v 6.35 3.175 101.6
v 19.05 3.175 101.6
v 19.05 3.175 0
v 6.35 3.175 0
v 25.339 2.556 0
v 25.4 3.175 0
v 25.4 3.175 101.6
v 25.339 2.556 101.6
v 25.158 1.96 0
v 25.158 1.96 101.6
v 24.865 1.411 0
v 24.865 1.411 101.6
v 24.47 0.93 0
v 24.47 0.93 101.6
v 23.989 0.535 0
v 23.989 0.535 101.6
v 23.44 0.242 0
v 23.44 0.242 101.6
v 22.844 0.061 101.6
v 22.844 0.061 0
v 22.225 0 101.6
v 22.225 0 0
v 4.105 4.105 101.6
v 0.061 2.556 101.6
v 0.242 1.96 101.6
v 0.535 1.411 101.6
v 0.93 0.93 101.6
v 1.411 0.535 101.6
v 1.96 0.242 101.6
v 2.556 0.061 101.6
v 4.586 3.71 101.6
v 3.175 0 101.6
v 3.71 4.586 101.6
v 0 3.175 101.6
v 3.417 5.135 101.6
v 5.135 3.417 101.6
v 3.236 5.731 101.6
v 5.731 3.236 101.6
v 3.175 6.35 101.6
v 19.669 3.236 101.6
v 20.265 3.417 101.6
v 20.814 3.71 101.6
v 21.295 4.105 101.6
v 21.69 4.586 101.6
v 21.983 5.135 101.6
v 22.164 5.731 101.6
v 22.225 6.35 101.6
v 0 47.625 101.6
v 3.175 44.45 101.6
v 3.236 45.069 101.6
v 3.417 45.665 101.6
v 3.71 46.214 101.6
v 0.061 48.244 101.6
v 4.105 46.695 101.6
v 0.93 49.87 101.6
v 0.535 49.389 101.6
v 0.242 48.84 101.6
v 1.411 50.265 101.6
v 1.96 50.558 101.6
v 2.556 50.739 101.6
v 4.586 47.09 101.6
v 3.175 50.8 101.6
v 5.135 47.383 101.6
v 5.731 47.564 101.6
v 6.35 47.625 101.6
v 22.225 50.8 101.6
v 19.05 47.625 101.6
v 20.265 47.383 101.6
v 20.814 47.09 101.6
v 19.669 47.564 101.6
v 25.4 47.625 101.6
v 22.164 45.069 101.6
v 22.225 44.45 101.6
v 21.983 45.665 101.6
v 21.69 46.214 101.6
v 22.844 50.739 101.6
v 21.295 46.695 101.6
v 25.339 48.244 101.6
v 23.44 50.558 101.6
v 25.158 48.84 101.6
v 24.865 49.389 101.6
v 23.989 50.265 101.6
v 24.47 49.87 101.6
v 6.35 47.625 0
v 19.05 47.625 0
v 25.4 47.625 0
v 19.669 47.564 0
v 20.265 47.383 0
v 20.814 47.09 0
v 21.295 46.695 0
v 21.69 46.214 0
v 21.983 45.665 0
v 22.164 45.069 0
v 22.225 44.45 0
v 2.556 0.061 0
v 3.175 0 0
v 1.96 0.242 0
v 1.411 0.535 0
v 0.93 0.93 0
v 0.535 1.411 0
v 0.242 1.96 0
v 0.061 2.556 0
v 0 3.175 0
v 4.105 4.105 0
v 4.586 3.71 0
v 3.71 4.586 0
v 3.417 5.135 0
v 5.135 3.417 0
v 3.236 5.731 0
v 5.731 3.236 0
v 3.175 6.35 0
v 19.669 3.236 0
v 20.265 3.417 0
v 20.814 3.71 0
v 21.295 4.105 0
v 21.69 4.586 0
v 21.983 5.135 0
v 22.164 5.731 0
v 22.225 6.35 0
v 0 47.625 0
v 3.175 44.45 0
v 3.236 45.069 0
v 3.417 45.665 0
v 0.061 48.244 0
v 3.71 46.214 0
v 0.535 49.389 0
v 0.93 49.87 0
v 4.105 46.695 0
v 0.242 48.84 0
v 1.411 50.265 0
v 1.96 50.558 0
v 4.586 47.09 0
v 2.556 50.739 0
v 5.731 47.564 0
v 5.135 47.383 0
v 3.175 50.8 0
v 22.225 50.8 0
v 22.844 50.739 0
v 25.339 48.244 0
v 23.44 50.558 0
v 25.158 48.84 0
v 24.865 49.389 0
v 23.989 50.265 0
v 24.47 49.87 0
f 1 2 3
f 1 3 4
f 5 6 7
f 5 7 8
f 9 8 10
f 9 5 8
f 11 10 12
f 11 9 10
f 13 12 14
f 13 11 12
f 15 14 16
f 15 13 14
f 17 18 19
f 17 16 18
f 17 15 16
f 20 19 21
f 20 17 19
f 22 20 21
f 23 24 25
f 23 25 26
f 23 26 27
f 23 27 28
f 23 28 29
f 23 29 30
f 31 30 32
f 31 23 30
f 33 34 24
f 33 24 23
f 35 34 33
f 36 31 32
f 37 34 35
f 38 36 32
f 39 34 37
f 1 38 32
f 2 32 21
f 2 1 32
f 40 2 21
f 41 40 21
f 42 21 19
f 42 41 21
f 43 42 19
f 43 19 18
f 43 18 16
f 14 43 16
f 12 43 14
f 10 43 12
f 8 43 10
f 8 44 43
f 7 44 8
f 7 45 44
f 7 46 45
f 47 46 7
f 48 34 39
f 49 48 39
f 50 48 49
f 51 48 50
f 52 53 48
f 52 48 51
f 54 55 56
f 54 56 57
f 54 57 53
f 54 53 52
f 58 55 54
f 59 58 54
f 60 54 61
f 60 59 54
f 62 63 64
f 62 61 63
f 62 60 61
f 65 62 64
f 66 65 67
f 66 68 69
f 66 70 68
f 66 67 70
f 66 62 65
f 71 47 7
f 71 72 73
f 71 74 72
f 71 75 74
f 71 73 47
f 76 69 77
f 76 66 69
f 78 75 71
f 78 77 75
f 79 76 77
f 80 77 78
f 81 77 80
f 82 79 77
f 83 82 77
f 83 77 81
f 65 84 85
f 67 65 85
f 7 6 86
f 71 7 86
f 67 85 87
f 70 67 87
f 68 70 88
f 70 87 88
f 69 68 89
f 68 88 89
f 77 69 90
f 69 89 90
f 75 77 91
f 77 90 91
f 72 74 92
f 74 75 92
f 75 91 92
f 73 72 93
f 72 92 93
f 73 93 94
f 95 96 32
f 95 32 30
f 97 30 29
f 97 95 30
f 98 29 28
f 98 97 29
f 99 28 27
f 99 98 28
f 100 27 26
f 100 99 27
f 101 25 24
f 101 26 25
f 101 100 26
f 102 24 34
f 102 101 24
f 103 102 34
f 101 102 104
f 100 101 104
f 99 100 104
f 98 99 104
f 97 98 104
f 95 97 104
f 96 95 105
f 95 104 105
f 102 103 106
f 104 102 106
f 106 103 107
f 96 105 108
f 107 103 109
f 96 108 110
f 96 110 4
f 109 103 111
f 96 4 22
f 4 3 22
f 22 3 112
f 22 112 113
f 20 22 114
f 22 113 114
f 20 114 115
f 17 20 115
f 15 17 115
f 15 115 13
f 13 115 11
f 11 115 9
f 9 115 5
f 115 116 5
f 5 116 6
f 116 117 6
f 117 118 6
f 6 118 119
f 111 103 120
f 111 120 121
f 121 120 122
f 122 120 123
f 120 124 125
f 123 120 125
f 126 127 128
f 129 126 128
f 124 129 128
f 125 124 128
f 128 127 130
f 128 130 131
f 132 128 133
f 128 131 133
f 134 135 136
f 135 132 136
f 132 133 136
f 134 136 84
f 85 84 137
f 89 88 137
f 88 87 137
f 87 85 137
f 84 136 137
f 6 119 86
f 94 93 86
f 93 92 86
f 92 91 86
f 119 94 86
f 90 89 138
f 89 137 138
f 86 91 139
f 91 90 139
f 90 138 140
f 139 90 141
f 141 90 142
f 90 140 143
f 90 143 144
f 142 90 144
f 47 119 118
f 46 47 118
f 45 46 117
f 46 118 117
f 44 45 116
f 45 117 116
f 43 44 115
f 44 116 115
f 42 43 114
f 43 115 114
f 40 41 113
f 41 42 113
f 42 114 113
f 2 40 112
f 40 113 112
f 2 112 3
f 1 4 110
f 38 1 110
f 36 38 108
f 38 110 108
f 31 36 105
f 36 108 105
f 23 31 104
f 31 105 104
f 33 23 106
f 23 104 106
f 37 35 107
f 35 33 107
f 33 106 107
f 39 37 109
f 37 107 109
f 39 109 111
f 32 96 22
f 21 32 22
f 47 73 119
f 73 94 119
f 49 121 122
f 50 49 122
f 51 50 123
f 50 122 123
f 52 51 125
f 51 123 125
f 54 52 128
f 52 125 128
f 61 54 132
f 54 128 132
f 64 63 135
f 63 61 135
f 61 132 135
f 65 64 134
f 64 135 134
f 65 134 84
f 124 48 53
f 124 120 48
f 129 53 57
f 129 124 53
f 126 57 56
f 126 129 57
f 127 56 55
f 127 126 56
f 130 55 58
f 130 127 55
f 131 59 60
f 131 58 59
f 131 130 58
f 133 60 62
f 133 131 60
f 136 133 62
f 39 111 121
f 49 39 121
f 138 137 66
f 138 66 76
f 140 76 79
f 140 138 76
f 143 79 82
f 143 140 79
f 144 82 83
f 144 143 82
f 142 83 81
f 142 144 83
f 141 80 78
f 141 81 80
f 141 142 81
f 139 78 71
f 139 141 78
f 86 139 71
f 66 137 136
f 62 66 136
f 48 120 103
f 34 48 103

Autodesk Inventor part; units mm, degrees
ref_plane "YZ Plane" through (0, 0, 0) normal (1, 0, 0) x (0, 1, 0)
ref_plane "XZ Plane" through (0, 0, 0) normal (0, 1, 0) x (-1, 0, 0)
ref_plane "XY Plane" through (0, 0, 0) normal (0, 0, 1) x (1, 0, 0)
sketch "Sketch1" plane through (0, 0, 0) normal (0, 0, 1) x (1, 0, 0)
  line L0 (3.175, 0) -> (22.225, 0)
  line L1 (25.4, 3.175) -> (25.4, 47.625)
  line L2 (22.225, 50.8) -> (3.175, 50.8)
  line L3 (0, 47.625) -> (0, 3.175)
  arc A0 (3.175, 50.8) -> (0, 47.625) centre (3.175, 47.625) ccw
  arc A1 (25.4, 47.625) -> (22.225, 50.8) centre (22.225, 47.625) ccw
  arc A2 (22.225, 0) -> (25.4, 3.175) centre (22.225, 3.175) ccw
  arc A3 (0, 3.175) -> (3.175, 0) centre (3.175, 3.175) ccw
  line L4 (6.35, 47.625) -> (19.05, 47.625)
  line L5 (22.225, 44.45) -> (22.225, 6.35)
  line L6 (19.05, 3.175) -> (6.35, 3.175)
  line L7 (3.175, 6.35) -> (3.175, 44.45)
  arc A4 (6.35, 47.625) -> (3.175, 44.45) centre (6.35, 44.45) ccw
  arc A5 (22.225, 44.45) -> (19.05, 47.625) centre (19.05, 44.45) ccw
  arc A6 (3.175, 6.35) -> (6.35, 3.175) centre (6.35, 6.35) ccw
  arc A7 (19.05, 3.175) -> (22.225, 6.35) centre (19.05, 6.35) ccw
  point P0 (0, 0)
  point P1 (25.4, 0)
  point P2 (0, 50.8)
  dimension "d0" = 50.8
  dimension "d1" = 25.4
  dimension "d2" = 3.175
  dimension "d3" = 3.175
  dimension "d4" = 3.175
  dimension "d5" = 3.175
  dimension "d6" = 3.175
  dimension "d7" = 3.175
  dimension "d8" = 3.175
  dimension "d9" = 3.175
  dimension "d10" = 3.175
extrude "Extrusion1" add sketch "Sketch1" along normal blind 101.6
properties part number "O channel 4 inch"
